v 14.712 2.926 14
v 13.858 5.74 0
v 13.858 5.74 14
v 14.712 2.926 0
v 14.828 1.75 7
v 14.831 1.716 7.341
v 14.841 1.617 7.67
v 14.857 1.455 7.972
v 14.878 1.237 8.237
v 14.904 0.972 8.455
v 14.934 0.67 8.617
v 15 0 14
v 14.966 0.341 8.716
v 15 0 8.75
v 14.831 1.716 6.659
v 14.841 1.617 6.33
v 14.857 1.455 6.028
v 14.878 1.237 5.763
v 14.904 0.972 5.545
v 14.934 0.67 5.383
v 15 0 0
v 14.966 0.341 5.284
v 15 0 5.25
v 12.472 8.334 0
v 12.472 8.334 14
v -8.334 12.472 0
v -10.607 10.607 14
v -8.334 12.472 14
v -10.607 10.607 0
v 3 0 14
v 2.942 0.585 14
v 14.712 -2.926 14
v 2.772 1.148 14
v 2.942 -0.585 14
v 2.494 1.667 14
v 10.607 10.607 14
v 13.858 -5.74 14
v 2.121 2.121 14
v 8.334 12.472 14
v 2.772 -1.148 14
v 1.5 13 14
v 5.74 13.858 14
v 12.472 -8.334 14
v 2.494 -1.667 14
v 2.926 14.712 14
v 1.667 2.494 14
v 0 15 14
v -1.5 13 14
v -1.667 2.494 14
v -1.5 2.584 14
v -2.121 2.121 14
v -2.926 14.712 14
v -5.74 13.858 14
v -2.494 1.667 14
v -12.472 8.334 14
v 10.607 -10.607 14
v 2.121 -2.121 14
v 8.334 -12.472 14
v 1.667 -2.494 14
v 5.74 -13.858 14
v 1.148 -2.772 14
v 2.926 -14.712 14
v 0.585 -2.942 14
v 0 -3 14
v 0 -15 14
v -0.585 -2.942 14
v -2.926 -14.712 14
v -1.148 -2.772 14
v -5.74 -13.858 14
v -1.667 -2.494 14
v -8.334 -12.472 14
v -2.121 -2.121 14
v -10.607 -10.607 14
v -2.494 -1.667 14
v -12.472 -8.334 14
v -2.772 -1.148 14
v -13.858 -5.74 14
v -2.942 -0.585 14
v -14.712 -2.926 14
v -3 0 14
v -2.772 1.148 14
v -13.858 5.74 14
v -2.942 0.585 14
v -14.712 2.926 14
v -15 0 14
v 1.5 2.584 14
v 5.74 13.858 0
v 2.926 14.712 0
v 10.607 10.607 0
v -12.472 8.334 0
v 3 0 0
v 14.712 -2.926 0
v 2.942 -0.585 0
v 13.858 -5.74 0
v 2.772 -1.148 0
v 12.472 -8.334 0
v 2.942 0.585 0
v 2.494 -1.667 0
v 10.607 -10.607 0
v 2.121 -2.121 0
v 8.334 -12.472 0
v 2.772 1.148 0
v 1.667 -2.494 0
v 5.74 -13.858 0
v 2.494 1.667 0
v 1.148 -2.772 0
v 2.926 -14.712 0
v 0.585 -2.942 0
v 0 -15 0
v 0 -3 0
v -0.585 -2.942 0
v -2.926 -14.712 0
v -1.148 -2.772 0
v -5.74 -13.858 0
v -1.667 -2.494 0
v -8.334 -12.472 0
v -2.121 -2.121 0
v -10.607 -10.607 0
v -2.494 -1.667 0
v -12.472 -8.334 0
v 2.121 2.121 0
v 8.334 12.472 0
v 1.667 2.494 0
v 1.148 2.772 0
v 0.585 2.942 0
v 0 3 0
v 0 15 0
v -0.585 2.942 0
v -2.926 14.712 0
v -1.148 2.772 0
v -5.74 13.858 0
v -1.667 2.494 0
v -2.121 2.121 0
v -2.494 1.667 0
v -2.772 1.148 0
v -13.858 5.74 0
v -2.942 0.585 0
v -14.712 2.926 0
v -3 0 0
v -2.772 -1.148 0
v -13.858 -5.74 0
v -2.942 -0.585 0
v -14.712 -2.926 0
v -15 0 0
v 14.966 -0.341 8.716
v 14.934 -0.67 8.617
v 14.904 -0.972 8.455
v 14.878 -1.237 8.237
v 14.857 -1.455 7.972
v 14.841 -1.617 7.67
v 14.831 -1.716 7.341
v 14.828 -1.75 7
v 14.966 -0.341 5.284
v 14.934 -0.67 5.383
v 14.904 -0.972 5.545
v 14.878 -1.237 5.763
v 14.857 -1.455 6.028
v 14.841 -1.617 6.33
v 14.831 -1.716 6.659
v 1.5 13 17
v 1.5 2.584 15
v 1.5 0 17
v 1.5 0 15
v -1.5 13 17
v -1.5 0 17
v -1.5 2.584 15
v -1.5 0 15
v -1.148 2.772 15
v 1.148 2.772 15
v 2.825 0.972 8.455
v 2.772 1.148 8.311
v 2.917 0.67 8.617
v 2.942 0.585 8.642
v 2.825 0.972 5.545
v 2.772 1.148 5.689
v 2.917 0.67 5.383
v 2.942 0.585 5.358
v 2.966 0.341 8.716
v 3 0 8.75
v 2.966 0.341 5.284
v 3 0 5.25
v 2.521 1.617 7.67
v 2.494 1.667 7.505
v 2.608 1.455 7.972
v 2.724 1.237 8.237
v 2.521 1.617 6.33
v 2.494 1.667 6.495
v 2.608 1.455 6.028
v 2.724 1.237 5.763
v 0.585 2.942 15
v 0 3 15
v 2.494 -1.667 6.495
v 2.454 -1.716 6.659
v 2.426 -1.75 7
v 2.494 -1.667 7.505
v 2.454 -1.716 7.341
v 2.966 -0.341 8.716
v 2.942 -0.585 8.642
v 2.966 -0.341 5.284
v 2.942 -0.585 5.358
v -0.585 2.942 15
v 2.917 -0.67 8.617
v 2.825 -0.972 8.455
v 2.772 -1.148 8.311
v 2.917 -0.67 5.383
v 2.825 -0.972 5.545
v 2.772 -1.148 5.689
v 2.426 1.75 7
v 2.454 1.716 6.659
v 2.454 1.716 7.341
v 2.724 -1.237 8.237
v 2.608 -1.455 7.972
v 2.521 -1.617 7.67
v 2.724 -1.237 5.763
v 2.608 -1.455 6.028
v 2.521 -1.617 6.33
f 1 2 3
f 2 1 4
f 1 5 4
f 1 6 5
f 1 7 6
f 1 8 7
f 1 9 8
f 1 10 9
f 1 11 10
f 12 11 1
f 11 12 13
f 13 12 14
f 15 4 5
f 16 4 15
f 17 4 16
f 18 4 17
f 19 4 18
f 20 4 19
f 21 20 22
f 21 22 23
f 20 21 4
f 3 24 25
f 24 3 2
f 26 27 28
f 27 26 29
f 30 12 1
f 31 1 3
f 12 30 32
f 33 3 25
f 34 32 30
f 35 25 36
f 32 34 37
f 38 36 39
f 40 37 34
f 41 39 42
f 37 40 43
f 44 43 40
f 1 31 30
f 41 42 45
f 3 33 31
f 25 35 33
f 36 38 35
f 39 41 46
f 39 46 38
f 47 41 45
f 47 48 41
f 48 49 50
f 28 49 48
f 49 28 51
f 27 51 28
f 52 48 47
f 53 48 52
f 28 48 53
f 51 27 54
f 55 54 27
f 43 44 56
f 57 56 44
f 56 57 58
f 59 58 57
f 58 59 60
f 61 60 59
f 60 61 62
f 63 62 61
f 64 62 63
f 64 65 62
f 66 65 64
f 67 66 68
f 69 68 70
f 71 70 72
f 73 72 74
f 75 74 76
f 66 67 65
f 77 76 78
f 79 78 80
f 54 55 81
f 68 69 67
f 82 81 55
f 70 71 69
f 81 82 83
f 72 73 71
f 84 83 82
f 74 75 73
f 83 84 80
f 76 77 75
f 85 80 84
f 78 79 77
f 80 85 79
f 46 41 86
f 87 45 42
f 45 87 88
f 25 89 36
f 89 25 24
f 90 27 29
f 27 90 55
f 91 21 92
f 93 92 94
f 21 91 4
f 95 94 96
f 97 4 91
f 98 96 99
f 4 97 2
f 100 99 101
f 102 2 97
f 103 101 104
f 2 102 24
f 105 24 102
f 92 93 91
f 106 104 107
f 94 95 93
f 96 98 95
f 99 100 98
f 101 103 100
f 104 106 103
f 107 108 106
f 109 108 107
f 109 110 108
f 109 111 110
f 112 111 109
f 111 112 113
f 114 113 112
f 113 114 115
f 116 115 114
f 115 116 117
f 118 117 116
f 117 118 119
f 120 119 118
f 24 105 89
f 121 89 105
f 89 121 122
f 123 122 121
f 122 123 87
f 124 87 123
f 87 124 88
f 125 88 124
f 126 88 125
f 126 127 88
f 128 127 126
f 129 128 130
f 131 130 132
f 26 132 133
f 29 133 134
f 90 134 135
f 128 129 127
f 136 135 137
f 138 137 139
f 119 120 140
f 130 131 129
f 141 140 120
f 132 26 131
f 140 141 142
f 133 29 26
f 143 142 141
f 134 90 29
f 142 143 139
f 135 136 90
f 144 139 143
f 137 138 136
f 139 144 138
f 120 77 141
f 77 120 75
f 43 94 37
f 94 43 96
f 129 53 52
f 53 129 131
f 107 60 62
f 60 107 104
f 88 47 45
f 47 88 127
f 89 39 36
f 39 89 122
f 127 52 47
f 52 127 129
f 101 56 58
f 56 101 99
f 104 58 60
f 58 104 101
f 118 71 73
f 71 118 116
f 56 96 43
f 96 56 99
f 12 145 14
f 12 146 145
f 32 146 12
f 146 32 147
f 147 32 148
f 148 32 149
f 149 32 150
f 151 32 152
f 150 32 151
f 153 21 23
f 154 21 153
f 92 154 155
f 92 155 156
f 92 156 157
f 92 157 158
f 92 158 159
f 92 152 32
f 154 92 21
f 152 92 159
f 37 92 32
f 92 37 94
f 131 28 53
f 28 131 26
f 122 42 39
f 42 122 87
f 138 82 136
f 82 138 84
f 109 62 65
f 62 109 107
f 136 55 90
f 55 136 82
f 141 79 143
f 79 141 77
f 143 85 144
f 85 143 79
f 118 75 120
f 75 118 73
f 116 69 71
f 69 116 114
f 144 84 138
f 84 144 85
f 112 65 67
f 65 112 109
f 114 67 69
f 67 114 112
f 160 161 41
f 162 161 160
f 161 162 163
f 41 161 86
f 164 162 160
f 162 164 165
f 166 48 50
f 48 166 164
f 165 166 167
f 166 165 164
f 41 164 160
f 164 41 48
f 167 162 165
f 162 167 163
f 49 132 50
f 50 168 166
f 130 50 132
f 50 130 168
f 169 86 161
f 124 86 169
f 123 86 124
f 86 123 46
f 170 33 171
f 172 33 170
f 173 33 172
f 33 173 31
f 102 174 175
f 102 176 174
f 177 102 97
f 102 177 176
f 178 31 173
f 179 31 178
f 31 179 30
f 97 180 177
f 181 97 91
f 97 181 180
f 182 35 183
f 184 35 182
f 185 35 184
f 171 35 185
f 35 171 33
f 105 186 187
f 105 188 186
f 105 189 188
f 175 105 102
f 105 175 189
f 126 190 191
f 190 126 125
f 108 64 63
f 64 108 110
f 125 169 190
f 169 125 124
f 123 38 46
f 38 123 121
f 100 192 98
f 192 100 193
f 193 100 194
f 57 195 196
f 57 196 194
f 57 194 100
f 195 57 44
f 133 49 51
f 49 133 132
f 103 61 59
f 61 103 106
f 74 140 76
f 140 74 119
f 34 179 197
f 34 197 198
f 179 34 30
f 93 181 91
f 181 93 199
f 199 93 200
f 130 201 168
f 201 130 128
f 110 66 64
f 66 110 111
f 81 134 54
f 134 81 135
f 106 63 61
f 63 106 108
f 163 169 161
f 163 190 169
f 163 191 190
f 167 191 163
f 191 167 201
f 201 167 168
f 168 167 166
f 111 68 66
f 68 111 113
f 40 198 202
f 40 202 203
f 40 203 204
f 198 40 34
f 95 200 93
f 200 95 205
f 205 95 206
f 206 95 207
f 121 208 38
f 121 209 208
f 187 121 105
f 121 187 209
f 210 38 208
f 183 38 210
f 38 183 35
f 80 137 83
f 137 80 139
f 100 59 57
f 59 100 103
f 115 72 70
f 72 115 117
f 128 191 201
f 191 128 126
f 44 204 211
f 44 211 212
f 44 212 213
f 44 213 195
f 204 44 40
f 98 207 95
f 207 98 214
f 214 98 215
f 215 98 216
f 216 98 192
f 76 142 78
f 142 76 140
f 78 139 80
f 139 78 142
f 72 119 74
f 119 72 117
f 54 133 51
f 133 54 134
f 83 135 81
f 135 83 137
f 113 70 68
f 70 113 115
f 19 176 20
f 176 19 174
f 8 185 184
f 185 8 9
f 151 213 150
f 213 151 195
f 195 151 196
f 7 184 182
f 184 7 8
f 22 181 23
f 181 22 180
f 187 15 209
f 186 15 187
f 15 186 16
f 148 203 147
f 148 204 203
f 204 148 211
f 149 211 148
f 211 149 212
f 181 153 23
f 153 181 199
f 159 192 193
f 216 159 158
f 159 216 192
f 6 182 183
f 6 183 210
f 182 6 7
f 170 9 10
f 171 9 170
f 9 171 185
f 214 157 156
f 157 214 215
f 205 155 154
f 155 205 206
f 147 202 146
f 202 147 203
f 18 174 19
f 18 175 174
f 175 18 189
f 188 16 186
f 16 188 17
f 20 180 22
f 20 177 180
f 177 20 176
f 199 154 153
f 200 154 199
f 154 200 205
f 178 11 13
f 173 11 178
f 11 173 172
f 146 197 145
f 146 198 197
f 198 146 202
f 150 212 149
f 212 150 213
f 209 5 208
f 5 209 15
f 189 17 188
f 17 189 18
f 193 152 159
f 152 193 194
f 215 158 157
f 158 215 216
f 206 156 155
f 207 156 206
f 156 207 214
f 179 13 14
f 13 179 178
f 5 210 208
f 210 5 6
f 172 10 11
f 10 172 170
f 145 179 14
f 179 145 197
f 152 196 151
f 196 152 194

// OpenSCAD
$fn = 32;

// ----------------------------------------------------------------------
// Control knob: pointer knob
// ----------------------------------------------------------------------

// --- parameters (mm) ---
rib_w = 3;                // pointer rib width
rib_h = 4;                // pointer rib height
knob_d = 30;              // knob body diameter
knob_h = 14;              // knob body height
bore_d = 6;               // shaft bore diameter
set_d = 3.5;              // set screw bore diameter

rib_poke = rib_h - 1;  // rib height above the top
total_h = knob_h + rib_h - 1;  // overall height

difference() {
  union() {
    cylinder(h = knob_h, d = knob_d);
    translate([-rib_w / 2, 0, knob_h - 1])
      cube([rib_w, knob_d / 2 - 2, rib_h]);
  }
  translate([0, 0, -1]) cylinder(h = knob_h + 2, d = bore_d);
  translate([-1, 0, knob_h / 2]) rotate([0, 90, 0])
    cylinder(h = knob_d / 2 + bore_d / 2 + 2, d = set_d);}
